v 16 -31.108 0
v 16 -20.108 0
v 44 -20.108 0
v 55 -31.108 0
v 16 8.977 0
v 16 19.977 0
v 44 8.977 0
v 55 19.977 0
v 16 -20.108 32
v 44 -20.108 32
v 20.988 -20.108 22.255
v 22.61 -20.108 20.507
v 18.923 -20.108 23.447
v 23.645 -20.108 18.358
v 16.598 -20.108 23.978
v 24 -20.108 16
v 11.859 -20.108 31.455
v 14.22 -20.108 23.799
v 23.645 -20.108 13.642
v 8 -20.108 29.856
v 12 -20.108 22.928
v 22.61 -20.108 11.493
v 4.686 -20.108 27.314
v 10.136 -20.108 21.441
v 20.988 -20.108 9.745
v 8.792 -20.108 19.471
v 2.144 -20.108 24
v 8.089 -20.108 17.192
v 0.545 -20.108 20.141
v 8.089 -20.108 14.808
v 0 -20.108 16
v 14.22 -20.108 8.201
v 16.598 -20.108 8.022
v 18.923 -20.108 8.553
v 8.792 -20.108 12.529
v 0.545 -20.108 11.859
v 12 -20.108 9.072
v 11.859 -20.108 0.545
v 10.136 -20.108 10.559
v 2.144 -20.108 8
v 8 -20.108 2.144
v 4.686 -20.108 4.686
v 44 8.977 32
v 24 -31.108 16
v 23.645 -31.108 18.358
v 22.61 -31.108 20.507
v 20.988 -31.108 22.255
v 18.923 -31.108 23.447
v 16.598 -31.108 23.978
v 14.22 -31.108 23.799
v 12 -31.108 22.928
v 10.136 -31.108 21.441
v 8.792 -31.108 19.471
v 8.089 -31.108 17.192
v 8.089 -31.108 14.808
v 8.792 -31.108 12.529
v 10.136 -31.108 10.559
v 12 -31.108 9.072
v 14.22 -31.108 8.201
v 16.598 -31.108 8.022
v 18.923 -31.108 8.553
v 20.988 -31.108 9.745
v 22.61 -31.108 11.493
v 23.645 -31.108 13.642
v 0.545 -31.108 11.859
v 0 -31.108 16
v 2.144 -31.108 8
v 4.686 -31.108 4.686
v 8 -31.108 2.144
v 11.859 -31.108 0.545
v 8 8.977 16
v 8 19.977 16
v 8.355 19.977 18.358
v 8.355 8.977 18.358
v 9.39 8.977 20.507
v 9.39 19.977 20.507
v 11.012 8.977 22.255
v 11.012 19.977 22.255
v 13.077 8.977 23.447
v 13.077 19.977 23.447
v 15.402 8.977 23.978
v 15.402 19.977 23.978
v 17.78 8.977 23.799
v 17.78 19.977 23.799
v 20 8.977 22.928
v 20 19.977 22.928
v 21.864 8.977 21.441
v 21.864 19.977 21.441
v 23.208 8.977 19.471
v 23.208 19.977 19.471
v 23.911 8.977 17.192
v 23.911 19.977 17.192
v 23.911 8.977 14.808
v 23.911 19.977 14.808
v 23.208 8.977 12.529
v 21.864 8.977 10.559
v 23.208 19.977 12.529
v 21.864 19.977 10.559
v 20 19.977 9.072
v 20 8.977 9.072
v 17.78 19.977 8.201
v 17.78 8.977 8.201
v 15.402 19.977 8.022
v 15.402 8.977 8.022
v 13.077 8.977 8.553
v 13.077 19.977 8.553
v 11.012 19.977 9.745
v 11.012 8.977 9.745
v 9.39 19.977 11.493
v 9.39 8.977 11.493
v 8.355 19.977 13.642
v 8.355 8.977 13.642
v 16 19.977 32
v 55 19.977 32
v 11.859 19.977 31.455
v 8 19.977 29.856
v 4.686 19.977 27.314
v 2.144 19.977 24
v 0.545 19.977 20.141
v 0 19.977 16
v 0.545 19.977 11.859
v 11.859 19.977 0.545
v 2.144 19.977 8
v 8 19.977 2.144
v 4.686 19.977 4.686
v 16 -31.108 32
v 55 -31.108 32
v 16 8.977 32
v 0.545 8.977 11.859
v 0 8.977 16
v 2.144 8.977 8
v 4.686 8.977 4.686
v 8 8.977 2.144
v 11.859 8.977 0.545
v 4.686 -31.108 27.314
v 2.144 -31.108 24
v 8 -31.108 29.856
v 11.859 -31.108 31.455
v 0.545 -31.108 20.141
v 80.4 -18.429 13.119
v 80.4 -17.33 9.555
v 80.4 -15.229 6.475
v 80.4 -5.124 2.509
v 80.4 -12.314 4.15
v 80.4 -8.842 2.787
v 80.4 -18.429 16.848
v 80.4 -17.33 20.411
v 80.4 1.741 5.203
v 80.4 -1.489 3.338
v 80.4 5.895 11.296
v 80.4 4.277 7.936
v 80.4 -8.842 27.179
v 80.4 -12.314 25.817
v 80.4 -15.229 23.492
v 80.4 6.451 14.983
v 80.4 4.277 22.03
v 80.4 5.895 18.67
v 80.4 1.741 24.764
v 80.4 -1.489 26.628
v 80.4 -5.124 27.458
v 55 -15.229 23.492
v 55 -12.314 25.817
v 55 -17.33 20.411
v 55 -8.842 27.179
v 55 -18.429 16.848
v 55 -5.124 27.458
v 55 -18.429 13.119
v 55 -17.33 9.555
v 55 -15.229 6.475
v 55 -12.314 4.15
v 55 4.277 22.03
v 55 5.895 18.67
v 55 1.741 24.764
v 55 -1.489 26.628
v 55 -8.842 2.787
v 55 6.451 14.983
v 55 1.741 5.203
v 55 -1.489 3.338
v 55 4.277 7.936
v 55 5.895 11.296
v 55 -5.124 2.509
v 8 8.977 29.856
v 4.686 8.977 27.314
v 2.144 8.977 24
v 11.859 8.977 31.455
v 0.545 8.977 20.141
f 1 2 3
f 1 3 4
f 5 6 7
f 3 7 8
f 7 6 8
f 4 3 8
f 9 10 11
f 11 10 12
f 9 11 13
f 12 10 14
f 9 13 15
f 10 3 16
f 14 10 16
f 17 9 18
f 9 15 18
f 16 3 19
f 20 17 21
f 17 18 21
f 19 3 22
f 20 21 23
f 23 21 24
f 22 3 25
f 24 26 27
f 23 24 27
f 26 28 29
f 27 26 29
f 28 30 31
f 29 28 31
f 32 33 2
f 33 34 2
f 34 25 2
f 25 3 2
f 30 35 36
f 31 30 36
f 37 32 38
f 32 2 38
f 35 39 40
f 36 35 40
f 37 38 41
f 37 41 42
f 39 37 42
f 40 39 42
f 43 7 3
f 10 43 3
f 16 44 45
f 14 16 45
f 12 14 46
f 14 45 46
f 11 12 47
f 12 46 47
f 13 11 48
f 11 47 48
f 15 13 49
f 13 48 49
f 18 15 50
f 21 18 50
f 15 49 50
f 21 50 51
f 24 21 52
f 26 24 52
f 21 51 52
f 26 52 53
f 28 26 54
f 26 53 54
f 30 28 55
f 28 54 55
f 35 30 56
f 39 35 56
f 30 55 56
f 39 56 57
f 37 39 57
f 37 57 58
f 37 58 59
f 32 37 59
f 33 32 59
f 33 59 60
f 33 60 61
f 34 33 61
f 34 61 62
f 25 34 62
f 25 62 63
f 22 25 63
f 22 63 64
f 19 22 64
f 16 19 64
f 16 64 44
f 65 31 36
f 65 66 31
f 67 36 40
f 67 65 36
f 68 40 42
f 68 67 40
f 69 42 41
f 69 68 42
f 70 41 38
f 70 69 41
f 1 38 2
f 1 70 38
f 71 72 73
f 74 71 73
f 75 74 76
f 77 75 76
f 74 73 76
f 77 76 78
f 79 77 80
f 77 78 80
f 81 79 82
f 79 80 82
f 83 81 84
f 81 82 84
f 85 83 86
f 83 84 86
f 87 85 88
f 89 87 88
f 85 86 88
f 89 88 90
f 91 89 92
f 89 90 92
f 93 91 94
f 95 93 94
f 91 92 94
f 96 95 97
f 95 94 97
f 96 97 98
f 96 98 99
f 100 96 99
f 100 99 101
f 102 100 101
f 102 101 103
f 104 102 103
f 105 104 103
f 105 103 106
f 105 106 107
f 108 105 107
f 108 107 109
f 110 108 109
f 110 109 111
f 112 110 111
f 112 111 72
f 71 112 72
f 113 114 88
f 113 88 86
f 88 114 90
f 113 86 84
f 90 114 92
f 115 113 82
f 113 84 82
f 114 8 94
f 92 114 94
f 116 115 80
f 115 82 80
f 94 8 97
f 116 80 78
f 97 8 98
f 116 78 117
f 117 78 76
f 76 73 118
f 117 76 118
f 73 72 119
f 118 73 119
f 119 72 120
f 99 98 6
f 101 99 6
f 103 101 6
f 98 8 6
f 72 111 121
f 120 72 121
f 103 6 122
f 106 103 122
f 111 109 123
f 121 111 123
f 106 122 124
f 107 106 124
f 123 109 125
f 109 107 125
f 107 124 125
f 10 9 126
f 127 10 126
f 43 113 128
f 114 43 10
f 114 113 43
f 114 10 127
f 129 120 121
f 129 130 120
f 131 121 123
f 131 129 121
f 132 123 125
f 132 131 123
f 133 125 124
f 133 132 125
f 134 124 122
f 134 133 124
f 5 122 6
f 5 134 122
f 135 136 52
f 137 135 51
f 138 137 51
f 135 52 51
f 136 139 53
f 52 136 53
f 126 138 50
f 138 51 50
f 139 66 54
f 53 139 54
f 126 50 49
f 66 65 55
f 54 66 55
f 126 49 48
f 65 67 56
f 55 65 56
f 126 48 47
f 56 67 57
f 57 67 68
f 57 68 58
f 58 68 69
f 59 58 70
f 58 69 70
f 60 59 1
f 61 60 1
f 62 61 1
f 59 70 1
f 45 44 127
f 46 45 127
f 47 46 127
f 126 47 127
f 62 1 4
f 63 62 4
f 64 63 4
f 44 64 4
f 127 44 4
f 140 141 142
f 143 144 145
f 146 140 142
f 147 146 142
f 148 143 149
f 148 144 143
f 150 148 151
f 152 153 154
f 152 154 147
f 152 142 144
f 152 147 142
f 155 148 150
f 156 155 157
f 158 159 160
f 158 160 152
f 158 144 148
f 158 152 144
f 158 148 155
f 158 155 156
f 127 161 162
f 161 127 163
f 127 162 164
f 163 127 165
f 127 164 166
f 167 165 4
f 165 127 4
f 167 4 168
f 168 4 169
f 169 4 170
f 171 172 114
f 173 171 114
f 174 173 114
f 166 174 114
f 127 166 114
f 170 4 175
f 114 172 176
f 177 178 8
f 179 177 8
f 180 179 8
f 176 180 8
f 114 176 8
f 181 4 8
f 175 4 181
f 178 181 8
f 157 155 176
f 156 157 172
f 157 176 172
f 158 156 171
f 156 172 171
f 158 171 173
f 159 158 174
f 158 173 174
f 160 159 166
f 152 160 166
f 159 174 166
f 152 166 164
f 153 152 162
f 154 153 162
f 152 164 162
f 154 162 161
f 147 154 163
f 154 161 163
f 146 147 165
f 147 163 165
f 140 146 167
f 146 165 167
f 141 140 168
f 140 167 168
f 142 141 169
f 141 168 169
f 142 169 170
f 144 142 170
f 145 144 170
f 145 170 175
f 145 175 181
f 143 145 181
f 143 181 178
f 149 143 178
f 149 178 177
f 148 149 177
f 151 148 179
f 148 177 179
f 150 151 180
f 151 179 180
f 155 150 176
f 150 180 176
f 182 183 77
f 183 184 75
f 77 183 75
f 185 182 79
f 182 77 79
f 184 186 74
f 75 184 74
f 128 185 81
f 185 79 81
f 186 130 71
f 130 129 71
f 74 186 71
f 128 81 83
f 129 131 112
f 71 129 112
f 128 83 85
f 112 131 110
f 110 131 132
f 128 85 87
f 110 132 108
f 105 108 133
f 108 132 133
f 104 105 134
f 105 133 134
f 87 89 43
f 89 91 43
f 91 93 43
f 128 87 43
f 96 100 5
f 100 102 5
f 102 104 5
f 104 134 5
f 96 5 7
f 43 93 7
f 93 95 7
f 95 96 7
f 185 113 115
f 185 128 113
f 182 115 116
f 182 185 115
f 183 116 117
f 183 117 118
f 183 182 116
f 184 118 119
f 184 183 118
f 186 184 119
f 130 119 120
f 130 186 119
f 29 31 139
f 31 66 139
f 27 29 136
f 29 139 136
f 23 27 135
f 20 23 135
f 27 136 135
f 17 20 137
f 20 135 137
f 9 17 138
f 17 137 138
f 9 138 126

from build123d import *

# Parameters (mm, degrees)
F1_DEPTH  = 32
F2_R      = 16
F3_R      = 15.99999
F4_R      = 16
F5_R      = 15.99999
F6_R      = 8
F7_DEPTH  = 25.4
F8_R      = 8
F9_DEPTH  = 25.4
F10_R     = 12.5095984865
F11_DEPTH = 25.4


# Not quite as in the source:
# - a fillet or chamfer is up to 0.001 mm smaller than in the source, because OpenCascade refuses the exact size


with BuildPart() as f1:
    # F0 (on Top) → F1 (new body)
    with BuildSketch(Plane.XY):
        Polygon((55, -31.1075148418), (55, 19.9773363869), (0, 19.9773363869), (0, 8.9773363869), (44, 8.9773363869), (44, -20.1075148418), (0, -20.1075148418), (0, -31.1075148418), align=None)
    extrude(amount=F1_DEPTH)

    # F2
    f2_edges = [f1.edges().sort_by_distance(p)[0] for p in [
        (0, -25.607515, 32),
    ]]
    fillet(f2_edges, radius=F2_R)

    # F3 (radius 16 in the source; OpenCascade refuses exactly that, so slightly less here)
    f3_edges = [f1.edges().sort_by_distance(p)[0] for p in [
        (0, -25.607515, 0),
    ]]
    fillet(f3_edges, radius=F3_R)

    # F4
    f4_edges = [f1.edges().sort_by_distance(p)[0] for p in [
        (0, 14.477336, 32),
    ]]
    fillet(f4_edges, radius=F4_R)

    # F5 (radius 16 in the source; OpenCascade refuses exactly that, so slightly less here)
    f5_edges = [f1.edges().sort_by_distance(p)[0] for p in [
        (0, 14.477336, 0),
    ]]
    fillet(f5_edges, radius=F5_R)

    # F6 (on face) → F7 (cut)
    with BuildSketch(Plane(origin=(0, 19.9773363869, 0), x_dir=(-1, 0, 0), z_dir=(0, 1, 0))):
        with Locations((-16, 16)):
            Circle(F6_R)
    extrude(amount=-F7_DEPTH, mode=Mode.SUBTRACT)

    # F8 (on face) → F9 (cut)
    with BuildSketch(Plane.XZ.offset(31.1075148418)):
        with Locations((16, 16)):
            Circle(F8_R)
    extrude(amount=-F9_DEPTH, mode=Mode.SUBTRACT)

    # F10 (on face) → F11 (join)
    with BuildSketch(Plane.YZ.offset(55)):
        with Locations((-6.0587972403, 14.9832107127)):
            Circle(F10_R)
    extrude(amount=F11_DEPTH)


solid = f1.part
